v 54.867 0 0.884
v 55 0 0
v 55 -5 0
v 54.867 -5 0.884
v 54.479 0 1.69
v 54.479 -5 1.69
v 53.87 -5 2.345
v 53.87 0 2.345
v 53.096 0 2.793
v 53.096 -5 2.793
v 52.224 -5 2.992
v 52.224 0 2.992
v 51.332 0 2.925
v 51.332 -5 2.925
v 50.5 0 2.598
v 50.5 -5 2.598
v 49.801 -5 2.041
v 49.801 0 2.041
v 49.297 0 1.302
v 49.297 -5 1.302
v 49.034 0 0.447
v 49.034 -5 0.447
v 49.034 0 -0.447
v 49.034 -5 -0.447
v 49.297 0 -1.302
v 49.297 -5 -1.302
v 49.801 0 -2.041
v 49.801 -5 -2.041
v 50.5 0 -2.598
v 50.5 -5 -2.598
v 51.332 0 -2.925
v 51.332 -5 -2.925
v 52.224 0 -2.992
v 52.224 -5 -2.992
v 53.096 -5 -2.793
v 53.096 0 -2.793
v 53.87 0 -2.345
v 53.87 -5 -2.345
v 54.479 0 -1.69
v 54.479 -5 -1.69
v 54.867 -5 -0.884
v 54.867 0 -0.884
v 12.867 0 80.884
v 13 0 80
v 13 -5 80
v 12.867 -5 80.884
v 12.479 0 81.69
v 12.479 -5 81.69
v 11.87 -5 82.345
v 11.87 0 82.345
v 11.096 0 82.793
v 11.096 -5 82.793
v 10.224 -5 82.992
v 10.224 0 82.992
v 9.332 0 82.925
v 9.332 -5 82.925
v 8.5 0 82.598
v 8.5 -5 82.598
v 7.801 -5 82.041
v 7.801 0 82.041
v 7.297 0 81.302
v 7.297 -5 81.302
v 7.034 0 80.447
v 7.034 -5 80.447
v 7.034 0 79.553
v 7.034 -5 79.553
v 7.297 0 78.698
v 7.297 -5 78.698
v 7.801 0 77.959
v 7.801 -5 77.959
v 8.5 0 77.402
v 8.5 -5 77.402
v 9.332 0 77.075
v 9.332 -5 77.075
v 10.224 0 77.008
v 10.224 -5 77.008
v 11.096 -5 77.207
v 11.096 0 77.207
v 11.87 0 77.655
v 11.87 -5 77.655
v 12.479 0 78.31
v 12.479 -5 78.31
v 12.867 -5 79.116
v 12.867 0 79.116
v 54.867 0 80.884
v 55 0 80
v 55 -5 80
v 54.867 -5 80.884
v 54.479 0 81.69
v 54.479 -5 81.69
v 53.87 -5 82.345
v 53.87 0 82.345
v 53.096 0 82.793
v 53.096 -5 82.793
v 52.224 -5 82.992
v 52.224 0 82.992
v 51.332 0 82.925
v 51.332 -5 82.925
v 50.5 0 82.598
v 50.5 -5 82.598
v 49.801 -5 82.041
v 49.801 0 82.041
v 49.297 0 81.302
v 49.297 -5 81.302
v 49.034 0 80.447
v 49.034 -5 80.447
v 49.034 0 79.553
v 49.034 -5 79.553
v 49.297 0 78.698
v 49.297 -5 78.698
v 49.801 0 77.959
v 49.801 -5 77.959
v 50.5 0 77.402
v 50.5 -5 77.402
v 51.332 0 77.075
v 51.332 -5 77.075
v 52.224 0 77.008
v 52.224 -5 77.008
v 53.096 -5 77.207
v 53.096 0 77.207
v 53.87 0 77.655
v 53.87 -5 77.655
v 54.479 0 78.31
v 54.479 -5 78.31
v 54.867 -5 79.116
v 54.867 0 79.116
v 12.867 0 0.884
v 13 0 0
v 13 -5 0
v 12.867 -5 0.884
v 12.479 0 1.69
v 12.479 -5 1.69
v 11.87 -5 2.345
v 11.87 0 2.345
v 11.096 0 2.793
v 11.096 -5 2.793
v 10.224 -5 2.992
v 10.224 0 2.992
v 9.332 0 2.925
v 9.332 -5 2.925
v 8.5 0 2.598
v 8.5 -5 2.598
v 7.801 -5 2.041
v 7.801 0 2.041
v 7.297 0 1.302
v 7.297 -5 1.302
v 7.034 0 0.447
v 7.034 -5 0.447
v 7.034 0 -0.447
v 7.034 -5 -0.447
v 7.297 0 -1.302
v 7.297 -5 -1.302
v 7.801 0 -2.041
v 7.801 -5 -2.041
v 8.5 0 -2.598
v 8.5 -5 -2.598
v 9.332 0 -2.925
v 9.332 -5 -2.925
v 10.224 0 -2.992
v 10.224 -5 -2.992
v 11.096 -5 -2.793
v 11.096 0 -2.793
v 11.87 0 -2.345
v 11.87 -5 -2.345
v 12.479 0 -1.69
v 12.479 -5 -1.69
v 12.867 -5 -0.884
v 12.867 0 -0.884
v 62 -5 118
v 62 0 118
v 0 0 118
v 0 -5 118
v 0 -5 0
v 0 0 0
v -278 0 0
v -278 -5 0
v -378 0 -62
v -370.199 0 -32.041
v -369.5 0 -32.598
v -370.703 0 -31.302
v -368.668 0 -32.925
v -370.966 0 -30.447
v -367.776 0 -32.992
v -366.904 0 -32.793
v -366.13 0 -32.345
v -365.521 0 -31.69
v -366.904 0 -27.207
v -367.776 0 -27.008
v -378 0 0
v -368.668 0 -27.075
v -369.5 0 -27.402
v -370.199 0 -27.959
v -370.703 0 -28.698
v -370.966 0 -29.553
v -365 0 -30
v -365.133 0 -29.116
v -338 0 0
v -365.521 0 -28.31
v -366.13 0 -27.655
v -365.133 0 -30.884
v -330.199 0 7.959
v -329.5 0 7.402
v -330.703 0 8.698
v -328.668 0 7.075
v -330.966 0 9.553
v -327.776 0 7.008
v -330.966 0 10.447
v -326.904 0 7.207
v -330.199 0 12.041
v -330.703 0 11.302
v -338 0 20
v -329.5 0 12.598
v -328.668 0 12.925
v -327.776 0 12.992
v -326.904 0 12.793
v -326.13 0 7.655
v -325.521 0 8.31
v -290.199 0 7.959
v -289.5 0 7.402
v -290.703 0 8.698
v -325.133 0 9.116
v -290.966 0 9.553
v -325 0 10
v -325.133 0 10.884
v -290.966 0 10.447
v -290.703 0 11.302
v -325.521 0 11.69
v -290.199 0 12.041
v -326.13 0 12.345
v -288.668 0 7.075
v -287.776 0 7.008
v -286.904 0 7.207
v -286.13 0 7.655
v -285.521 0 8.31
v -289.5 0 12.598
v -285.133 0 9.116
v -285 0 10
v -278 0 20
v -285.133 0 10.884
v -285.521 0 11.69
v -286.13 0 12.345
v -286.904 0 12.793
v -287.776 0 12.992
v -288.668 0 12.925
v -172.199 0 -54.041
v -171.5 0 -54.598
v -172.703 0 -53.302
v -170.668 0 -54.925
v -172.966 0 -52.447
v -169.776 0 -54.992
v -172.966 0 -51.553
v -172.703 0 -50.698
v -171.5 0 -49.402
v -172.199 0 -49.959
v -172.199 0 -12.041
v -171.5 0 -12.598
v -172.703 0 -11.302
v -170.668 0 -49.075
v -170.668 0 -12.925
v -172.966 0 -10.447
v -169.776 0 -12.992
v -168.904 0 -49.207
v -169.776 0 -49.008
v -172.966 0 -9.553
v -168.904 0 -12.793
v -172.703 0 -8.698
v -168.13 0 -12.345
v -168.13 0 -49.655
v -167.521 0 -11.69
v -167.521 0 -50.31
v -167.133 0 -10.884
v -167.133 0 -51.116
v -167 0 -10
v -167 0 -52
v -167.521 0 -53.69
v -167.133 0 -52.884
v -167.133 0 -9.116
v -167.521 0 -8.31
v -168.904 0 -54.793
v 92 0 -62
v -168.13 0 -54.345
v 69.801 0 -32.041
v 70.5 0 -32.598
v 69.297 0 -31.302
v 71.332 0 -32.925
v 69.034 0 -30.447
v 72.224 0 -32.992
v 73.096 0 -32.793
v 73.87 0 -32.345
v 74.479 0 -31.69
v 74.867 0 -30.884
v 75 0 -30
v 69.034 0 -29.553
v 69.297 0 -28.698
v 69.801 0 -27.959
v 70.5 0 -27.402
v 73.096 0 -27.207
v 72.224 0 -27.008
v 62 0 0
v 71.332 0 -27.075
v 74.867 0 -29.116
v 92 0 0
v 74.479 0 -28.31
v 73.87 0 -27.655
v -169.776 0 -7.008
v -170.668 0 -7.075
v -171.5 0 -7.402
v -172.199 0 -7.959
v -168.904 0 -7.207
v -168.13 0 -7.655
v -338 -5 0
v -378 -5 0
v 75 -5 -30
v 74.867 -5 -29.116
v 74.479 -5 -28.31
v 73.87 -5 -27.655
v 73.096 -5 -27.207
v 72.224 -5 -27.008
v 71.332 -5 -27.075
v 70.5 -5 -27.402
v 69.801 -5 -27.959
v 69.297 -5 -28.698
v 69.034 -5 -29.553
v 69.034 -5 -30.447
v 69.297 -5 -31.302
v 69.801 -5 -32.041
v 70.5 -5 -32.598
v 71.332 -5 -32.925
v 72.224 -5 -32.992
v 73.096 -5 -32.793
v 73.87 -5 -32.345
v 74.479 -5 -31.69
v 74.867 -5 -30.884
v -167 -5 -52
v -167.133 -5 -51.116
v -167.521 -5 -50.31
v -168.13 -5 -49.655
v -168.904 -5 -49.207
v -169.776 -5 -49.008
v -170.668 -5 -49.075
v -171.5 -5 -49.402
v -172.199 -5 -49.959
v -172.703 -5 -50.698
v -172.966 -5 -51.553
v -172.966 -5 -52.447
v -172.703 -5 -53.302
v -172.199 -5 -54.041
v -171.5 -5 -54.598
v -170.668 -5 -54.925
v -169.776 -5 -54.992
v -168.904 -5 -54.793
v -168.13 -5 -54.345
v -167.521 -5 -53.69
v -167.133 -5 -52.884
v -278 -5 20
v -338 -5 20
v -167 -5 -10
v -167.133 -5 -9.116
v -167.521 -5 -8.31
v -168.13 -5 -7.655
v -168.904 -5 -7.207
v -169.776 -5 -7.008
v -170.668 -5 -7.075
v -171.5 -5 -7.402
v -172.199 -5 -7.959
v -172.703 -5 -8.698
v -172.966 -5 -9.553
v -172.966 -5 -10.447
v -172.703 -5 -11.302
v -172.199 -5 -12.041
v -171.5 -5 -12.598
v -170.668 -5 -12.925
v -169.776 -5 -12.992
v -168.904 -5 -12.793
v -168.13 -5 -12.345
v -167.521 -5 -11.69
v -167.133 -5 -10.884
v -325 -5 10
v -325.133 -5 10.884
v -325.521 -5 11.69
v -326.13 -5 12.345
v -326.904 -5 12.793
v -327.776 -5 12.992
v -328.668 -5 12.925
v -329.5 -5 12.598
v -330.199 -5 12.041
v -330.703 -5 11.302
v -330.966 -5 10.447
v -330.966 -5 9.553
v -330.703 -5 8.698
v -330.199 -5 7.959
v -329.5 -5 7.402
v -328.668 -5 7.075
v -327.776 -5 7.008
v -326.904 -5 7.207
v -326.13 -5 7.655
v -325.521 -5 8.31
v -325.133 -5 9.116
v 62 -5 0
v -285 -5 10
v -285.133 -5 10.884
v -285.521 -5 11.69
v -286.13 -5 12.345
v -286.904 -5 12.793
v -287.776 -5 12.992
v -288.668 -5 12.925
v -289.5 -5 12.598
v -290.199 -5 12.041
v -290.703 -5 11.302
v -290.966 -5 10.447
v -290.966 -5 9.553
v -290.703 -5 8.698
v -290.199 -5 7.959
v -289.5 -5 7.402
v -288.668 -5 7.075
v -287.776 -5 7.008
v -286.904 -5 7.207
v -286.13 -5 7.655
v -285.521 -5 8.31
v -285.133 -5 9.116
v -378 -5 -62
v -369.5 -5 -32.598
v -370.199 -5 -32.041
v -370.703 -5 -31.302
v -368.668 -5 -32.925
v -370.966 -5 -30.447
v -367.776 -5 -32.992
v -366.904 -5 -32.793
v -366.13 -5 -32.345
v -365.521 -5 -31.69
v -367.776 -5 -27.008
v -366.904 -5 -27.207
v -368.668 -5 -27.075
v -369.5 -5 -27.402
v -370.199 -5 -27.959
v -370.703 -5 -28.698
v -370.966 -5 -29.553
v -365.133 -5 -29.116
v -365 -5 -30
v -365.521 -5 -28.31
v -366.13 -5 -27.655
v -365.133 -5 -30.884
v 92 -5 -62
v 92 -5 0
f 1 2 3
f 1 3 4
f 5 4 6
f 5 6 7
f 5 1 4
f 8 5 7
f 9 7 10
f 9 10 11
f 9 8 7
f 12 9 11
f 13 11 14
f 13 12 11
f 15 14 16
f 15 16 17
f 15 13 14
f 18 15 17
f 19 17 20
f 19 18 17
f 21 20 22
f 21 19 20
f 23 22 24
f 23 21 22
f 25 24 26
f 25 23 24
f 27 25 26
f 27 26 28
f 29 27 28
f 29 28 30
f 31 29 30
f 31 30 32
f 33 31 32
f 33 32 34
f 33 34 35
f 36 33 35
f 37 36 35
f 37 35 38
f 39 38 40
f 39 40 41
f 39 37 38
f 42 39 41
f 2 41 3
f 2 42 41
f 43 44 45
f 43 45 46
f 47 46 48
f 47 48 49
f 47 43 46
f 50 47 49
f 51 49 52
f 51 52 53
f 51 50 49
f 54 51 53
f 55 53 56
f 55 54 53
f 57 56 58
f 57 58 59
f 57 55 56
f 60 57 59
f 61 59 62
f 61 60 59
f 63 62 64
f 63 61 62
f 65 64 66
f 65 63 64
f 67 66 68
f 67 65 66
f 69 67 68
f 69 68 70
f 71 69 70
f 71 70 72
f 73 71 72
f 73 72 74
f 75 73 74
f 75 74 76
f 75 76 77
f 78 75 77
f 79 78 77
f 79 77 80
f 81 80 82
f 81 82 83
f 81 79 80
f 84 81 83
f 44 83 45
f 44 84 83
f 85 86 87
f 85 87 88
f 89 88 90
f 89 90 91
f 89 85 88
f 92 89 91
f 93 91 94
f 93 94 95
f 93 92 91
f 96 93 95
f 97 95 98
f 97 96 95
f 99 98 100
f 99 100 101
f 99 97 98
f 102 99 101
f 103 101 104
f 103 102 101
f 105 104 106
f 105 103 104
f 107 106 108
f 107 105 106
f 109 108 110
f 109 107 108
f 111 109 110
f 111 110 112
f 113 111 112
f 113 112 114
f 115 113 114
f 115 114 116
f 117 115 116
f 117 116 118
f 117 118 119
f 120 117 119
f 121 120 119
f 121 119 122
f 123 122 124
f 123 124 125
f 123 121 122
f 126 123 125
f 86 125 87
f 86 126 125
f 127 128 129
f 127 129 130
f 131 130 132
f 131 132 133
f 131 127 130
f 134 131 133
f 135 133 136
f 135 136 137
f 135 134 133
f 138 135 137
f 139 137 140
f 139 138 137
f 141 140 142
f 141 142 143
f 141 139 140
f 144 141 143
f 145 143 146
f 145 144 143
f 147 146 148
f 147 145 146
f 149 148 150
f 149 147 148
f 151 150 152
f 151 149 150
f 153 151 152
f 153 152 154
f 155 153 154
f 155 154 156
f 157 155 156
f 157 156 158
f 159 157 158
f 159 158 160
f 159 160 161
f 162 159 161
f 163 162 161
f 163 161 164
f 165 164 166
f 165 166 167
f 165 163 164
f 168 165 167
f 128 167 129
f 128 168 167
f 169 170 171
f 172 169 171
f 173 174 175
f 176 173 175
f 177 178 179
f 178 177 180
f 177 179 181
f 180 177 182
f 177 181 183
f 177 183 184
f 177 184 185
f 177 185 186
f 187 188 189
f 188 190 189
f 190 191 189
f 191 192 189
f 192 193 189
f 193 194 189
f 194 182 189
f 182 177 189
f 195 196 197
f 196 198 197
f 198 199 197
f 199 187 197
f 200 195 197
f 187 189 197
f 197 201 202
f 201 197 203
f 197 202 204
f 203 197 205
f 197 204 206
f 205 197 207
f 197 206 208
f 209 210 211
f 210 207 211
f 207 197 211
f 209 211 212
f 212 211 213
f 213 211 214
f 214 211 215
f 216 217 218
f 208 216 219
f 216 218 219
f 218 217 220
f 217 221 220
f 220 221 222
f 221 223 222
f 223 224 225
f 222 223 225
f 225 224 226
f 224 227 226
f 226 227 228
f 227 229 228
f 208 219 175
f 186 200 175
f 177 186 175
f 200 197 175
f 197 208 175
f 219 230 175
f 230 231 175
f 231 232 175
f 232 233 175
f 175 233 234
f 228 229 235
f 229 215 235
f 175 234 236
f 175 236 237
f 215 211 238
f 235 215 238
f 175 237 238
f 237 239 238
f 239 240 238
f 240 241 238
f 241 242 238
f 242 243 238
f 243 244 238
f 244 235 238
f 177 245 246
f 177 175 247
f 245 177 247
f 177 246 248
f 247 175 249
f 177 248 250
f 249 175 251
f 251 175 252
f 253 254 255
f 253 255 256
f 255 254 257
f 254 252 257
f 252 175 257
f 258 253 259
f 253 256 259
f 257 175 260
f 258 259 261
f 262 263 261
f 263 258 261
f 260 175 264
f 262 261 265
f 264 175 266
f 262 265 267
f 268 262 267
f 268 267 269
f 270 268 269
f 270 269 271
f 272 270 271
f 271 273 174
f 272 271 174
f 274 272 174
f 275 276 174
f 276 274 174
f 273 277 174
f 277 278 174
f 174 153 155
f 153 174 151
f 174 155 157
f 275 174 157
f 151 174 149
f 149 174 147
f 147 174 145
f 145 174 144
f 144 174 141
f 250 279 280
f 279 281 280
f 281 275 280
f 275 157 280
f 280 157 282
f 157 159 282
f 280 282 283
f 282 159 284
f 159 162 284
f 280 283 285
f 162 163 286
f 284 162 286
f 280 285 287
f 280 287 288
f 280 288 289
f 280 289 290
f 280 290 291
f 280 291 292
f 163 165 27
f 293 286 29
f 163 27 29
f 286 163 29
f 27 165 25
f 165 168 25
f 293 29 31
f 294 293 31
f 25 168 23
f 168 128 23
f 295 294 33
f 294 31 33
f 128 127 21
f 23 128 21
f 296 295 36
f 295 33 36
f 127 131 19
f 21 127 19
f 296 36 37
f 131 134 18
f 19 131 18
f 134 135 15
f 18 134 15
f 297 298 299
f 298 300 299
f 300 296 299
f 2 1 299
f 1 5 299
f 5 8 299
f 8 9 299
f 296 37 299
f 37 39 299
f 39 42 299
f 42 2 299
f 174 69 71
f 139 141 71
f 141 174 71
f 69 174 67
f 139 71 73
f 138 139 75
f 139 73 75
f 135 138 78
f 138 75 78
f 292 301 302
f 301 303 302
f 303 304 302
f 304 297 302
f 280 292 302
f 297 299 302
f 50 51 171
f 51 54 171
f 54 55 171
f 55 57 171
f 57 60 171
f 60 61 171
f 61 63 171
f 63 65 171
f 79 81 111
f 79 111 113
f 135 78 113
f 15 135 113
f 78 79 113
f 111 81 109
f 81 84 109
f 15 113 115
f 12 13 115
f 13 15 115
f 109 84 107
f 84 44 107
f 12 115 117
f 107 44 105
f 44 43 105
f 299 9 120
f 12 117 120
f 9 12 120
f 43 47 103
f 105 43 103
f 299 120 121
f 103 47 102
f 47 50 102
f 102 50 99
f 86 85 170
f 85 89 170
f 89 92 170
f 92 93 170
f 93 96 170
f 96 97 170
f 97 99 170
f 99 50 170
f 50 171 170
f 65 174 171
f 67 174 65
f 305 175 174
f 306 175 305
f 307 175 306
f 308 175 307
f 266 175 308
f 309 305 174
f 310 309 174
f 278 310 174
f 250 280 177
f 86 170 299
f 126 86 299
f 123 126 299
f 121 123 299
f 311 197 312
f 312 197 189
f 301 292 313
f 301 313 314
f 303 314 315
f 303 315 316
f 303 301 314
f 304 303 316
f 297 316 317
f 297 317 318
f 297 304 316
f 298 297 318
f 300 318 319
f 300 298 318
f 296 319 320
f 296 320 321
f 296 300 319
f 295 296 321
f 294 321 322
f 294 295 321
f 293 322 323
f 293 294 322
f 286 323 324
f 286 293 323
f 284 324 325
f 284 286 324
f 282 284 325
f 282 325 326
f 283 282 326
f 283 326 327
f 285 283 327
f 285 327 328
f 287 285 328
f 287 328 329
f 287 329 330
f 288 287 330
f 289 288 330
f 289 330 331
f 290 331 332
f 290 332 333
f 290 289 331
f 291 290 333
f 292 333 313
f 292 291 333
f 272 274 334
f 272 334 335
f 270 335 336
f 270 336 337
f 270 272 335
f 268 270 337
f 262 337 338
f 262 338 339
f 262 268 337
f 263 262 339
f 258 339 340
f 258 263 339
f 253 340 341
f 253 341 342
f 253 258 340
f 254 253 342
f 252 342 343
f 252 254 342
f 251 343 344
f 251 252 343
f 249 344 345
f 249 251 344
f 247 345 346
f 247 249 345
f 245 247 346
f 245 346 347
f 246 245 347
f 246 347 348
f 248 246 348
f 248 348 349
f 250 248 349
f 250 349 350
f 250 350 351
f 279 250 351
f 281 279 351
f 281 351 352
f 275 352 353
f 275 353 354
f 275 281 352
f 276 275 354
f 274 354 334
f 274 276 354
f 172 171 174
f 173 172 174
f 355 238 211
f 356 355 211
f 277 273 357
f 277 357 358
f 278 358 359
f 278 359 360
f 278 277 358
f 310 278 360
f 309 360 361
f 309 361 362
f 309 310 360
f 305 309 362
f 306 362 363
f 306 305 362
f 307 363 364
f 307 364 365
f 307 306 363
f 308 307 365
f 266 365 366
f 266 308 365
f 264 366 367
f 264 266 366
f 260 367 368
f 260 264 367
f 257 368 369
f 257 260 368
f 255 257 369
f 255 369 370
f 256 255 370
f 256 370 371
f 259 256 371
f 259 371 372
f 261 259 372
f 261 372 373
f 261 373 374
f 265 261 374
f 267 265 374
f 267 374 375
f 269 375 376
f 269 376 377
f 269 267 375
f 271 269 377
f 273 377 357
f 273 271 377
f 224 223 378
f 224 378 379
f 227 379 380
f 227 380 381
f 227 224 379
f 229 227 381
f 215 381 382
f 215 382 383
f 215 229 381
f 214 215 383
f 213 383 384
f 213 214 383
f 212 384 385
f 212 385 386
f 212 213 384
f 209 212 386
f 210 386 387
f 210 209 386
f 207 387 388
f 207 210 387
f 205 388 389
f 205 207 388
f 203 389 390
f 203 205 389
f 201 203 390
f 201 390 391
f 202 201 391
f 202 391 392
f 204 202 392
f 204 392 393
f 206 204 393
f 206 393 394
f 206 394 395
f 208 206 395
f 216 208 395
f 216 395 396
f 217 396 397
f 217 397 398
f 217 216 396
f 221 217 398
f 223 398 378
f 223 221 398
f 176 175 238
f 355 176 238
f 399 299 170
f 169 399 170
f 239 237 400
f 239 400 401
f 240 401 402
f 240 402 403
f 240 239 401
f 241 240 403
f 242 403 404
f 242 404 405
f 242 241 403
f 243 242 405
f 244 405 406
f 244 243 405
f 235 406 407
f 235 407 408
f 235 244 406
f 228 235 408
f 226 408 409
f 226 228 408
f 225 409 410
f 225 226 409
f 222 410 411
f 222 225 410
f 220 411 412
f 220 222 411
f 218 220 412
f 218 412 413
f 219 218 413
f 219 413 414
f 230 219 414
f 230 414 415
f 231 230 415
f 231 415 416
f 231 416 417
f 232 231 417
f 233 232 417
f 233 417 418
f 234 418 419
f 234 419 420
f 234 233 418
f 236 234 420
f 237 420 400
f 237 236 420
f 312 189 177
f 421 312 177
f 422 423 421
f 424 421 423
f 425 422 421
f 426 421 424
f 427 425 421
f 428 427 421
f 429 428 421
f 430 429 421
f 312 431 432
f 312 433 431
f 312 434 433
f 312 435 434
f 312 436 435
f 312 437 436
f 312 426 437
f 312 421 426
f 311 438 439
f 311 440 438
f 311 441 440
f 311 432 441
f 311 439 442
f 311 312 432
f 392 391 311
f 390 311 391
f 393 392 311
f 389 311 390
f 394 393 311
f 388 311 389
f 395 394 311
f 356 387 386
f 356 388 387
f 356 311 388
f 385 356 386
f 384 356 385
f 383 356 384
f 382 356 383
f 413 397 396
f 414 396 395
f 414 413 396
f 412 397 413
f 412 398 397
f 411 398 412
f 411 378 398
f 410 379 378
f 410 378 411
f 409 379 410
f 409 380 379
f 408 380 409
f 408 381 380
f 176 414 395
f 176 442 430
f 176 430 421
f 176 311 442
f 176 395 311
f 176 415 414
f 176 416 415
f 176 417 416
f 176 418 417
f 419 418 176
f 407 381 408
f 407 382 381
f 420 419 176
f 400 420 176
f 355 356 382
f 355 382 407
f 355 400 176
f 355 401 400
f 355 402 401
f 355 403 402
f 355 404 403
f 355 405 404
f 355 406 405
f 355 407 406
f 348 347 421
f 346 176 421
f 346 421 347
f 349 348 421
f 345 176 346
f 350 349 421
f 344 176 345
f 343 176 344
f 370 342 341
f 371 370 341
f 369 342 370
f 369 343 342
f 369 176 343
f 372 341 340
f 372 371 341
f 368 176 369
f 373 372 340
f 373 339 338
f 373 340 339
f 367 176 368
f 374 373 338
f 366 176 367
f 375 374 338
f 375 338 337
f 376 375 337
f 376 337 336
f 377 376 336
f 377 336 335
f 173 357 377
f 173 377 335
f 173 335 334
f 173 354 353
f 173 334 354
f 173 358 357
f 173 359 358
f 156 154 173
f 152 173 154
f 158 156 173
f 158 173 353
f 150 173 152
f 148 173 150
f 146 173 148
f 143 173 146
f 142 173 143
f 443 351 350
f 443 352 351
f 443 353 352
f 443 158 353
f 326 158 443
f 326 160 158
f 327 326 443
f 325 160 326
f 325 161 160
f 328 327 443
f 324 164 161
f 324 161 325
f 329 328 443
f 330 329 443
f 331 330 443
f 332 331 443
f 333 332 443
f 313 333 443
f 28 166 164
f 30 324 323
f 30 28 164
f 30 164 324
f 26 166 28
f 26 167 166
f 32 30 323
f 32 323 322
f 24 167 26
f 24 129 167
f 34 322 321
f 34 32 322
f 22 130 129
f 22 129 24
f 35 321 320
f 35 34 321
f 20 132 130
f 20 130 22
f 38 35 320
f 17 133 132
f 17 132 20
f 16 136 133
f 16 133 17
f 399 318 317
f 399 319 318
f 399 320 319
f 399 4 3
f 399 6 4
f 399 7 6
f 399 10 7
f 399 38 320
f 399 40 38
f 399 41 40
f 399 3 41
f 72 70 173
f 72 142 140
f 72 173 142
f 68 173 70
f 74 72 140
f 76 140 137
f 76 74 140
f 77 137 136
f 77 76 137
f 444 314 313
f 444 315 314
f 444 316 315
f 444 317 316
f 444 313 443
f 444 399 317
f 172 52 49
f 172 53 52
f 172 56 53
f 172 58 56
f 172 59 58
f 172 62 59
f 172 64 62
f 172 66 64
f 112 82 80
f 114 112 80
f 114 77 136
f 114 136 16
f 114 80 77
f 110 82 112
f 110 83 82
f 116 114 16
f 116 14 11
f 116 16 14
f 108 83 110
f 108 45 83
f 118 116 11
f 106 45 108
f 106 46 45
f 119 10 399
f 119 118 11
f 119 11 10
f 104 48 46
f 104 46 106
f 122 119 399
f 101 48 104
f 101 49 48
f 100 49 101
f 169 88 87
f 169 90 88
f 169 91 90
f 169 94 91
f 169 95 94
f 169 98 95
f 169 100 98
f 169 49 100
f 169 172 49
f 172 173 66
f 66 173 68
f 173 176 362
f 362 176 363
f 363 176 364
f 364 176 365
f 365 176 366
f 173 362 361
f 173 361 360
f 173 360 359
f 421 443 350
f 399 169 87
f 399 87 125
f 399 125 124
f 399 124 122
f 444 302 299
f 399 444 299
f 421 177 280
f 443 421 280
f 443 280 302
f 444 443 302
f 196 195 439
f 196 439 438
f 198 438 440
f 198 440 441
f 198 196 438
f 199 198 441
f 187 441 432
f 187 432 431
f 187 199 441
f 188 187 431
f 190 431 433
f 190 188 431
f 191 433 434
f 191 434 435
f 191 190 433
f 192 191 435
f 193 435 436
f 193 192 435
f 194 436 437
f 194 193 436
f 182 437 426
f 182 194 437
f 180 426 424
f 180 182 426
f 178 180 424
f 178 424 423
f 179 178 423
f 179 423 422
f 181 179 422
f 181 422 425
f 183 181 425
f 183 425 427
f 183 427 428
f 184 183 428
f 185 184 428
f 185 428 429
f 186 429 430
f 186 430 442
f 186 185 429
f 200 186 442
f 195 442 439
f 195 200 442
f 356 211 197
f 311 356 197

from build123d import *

# Parameters (mm, degrees)
F0_R     = 3
F1_DEPTH = 5


with BuildPart() as f1:
    # F0 (on Front) → F1 (new body)
    with BuildSketch(Plane.XZ):
        Polygon((62, 118), (0, 118), (0, 0), (-278, 0), (-278, 20), (-338, 20), (-338, 0), (-378, 0), (-378, -62), (92, -62), (92, 0), (62, 0), align=None)
        with Locations((-368, -30)):
            Circle(F0_R, mode=Mode.SUBTRACT)
        with Locations((-170, -52)):
            Circle(F0_R, mode=Mode.SUBTRACT)
        with Locations((-328, 10)):
            Circle(F0_R, mode=Mode.SUBTRACT)
        with Locations((-288, 10)):
            Circle(F0_R, mode=Mode.SUBTRACT)
        with Locations((-170, -10)):
            Circle(F0_R, mode=Mode.SUBTRACT)
        with Locations((72, -30)):
            Circle(F0_R, mode=Mode.SUBTRACT)
        with Locations((10, 0)):
            Circle(F0_R, mode=Mode.SUBTRACT)
        with Locations((52, 0)):
            Circle(F0_R, mode=Mode.SUBTRACT)
        with Locations((10, 80)):
            Circle(F0_R, mode=Mode.SUBTRACT)
        with Locations((52, 80)):
            Circle(F0_R, mode=Mode.SUBTRACT)
    extrude(amount=F1_DEPTH)


solid = f1.part
